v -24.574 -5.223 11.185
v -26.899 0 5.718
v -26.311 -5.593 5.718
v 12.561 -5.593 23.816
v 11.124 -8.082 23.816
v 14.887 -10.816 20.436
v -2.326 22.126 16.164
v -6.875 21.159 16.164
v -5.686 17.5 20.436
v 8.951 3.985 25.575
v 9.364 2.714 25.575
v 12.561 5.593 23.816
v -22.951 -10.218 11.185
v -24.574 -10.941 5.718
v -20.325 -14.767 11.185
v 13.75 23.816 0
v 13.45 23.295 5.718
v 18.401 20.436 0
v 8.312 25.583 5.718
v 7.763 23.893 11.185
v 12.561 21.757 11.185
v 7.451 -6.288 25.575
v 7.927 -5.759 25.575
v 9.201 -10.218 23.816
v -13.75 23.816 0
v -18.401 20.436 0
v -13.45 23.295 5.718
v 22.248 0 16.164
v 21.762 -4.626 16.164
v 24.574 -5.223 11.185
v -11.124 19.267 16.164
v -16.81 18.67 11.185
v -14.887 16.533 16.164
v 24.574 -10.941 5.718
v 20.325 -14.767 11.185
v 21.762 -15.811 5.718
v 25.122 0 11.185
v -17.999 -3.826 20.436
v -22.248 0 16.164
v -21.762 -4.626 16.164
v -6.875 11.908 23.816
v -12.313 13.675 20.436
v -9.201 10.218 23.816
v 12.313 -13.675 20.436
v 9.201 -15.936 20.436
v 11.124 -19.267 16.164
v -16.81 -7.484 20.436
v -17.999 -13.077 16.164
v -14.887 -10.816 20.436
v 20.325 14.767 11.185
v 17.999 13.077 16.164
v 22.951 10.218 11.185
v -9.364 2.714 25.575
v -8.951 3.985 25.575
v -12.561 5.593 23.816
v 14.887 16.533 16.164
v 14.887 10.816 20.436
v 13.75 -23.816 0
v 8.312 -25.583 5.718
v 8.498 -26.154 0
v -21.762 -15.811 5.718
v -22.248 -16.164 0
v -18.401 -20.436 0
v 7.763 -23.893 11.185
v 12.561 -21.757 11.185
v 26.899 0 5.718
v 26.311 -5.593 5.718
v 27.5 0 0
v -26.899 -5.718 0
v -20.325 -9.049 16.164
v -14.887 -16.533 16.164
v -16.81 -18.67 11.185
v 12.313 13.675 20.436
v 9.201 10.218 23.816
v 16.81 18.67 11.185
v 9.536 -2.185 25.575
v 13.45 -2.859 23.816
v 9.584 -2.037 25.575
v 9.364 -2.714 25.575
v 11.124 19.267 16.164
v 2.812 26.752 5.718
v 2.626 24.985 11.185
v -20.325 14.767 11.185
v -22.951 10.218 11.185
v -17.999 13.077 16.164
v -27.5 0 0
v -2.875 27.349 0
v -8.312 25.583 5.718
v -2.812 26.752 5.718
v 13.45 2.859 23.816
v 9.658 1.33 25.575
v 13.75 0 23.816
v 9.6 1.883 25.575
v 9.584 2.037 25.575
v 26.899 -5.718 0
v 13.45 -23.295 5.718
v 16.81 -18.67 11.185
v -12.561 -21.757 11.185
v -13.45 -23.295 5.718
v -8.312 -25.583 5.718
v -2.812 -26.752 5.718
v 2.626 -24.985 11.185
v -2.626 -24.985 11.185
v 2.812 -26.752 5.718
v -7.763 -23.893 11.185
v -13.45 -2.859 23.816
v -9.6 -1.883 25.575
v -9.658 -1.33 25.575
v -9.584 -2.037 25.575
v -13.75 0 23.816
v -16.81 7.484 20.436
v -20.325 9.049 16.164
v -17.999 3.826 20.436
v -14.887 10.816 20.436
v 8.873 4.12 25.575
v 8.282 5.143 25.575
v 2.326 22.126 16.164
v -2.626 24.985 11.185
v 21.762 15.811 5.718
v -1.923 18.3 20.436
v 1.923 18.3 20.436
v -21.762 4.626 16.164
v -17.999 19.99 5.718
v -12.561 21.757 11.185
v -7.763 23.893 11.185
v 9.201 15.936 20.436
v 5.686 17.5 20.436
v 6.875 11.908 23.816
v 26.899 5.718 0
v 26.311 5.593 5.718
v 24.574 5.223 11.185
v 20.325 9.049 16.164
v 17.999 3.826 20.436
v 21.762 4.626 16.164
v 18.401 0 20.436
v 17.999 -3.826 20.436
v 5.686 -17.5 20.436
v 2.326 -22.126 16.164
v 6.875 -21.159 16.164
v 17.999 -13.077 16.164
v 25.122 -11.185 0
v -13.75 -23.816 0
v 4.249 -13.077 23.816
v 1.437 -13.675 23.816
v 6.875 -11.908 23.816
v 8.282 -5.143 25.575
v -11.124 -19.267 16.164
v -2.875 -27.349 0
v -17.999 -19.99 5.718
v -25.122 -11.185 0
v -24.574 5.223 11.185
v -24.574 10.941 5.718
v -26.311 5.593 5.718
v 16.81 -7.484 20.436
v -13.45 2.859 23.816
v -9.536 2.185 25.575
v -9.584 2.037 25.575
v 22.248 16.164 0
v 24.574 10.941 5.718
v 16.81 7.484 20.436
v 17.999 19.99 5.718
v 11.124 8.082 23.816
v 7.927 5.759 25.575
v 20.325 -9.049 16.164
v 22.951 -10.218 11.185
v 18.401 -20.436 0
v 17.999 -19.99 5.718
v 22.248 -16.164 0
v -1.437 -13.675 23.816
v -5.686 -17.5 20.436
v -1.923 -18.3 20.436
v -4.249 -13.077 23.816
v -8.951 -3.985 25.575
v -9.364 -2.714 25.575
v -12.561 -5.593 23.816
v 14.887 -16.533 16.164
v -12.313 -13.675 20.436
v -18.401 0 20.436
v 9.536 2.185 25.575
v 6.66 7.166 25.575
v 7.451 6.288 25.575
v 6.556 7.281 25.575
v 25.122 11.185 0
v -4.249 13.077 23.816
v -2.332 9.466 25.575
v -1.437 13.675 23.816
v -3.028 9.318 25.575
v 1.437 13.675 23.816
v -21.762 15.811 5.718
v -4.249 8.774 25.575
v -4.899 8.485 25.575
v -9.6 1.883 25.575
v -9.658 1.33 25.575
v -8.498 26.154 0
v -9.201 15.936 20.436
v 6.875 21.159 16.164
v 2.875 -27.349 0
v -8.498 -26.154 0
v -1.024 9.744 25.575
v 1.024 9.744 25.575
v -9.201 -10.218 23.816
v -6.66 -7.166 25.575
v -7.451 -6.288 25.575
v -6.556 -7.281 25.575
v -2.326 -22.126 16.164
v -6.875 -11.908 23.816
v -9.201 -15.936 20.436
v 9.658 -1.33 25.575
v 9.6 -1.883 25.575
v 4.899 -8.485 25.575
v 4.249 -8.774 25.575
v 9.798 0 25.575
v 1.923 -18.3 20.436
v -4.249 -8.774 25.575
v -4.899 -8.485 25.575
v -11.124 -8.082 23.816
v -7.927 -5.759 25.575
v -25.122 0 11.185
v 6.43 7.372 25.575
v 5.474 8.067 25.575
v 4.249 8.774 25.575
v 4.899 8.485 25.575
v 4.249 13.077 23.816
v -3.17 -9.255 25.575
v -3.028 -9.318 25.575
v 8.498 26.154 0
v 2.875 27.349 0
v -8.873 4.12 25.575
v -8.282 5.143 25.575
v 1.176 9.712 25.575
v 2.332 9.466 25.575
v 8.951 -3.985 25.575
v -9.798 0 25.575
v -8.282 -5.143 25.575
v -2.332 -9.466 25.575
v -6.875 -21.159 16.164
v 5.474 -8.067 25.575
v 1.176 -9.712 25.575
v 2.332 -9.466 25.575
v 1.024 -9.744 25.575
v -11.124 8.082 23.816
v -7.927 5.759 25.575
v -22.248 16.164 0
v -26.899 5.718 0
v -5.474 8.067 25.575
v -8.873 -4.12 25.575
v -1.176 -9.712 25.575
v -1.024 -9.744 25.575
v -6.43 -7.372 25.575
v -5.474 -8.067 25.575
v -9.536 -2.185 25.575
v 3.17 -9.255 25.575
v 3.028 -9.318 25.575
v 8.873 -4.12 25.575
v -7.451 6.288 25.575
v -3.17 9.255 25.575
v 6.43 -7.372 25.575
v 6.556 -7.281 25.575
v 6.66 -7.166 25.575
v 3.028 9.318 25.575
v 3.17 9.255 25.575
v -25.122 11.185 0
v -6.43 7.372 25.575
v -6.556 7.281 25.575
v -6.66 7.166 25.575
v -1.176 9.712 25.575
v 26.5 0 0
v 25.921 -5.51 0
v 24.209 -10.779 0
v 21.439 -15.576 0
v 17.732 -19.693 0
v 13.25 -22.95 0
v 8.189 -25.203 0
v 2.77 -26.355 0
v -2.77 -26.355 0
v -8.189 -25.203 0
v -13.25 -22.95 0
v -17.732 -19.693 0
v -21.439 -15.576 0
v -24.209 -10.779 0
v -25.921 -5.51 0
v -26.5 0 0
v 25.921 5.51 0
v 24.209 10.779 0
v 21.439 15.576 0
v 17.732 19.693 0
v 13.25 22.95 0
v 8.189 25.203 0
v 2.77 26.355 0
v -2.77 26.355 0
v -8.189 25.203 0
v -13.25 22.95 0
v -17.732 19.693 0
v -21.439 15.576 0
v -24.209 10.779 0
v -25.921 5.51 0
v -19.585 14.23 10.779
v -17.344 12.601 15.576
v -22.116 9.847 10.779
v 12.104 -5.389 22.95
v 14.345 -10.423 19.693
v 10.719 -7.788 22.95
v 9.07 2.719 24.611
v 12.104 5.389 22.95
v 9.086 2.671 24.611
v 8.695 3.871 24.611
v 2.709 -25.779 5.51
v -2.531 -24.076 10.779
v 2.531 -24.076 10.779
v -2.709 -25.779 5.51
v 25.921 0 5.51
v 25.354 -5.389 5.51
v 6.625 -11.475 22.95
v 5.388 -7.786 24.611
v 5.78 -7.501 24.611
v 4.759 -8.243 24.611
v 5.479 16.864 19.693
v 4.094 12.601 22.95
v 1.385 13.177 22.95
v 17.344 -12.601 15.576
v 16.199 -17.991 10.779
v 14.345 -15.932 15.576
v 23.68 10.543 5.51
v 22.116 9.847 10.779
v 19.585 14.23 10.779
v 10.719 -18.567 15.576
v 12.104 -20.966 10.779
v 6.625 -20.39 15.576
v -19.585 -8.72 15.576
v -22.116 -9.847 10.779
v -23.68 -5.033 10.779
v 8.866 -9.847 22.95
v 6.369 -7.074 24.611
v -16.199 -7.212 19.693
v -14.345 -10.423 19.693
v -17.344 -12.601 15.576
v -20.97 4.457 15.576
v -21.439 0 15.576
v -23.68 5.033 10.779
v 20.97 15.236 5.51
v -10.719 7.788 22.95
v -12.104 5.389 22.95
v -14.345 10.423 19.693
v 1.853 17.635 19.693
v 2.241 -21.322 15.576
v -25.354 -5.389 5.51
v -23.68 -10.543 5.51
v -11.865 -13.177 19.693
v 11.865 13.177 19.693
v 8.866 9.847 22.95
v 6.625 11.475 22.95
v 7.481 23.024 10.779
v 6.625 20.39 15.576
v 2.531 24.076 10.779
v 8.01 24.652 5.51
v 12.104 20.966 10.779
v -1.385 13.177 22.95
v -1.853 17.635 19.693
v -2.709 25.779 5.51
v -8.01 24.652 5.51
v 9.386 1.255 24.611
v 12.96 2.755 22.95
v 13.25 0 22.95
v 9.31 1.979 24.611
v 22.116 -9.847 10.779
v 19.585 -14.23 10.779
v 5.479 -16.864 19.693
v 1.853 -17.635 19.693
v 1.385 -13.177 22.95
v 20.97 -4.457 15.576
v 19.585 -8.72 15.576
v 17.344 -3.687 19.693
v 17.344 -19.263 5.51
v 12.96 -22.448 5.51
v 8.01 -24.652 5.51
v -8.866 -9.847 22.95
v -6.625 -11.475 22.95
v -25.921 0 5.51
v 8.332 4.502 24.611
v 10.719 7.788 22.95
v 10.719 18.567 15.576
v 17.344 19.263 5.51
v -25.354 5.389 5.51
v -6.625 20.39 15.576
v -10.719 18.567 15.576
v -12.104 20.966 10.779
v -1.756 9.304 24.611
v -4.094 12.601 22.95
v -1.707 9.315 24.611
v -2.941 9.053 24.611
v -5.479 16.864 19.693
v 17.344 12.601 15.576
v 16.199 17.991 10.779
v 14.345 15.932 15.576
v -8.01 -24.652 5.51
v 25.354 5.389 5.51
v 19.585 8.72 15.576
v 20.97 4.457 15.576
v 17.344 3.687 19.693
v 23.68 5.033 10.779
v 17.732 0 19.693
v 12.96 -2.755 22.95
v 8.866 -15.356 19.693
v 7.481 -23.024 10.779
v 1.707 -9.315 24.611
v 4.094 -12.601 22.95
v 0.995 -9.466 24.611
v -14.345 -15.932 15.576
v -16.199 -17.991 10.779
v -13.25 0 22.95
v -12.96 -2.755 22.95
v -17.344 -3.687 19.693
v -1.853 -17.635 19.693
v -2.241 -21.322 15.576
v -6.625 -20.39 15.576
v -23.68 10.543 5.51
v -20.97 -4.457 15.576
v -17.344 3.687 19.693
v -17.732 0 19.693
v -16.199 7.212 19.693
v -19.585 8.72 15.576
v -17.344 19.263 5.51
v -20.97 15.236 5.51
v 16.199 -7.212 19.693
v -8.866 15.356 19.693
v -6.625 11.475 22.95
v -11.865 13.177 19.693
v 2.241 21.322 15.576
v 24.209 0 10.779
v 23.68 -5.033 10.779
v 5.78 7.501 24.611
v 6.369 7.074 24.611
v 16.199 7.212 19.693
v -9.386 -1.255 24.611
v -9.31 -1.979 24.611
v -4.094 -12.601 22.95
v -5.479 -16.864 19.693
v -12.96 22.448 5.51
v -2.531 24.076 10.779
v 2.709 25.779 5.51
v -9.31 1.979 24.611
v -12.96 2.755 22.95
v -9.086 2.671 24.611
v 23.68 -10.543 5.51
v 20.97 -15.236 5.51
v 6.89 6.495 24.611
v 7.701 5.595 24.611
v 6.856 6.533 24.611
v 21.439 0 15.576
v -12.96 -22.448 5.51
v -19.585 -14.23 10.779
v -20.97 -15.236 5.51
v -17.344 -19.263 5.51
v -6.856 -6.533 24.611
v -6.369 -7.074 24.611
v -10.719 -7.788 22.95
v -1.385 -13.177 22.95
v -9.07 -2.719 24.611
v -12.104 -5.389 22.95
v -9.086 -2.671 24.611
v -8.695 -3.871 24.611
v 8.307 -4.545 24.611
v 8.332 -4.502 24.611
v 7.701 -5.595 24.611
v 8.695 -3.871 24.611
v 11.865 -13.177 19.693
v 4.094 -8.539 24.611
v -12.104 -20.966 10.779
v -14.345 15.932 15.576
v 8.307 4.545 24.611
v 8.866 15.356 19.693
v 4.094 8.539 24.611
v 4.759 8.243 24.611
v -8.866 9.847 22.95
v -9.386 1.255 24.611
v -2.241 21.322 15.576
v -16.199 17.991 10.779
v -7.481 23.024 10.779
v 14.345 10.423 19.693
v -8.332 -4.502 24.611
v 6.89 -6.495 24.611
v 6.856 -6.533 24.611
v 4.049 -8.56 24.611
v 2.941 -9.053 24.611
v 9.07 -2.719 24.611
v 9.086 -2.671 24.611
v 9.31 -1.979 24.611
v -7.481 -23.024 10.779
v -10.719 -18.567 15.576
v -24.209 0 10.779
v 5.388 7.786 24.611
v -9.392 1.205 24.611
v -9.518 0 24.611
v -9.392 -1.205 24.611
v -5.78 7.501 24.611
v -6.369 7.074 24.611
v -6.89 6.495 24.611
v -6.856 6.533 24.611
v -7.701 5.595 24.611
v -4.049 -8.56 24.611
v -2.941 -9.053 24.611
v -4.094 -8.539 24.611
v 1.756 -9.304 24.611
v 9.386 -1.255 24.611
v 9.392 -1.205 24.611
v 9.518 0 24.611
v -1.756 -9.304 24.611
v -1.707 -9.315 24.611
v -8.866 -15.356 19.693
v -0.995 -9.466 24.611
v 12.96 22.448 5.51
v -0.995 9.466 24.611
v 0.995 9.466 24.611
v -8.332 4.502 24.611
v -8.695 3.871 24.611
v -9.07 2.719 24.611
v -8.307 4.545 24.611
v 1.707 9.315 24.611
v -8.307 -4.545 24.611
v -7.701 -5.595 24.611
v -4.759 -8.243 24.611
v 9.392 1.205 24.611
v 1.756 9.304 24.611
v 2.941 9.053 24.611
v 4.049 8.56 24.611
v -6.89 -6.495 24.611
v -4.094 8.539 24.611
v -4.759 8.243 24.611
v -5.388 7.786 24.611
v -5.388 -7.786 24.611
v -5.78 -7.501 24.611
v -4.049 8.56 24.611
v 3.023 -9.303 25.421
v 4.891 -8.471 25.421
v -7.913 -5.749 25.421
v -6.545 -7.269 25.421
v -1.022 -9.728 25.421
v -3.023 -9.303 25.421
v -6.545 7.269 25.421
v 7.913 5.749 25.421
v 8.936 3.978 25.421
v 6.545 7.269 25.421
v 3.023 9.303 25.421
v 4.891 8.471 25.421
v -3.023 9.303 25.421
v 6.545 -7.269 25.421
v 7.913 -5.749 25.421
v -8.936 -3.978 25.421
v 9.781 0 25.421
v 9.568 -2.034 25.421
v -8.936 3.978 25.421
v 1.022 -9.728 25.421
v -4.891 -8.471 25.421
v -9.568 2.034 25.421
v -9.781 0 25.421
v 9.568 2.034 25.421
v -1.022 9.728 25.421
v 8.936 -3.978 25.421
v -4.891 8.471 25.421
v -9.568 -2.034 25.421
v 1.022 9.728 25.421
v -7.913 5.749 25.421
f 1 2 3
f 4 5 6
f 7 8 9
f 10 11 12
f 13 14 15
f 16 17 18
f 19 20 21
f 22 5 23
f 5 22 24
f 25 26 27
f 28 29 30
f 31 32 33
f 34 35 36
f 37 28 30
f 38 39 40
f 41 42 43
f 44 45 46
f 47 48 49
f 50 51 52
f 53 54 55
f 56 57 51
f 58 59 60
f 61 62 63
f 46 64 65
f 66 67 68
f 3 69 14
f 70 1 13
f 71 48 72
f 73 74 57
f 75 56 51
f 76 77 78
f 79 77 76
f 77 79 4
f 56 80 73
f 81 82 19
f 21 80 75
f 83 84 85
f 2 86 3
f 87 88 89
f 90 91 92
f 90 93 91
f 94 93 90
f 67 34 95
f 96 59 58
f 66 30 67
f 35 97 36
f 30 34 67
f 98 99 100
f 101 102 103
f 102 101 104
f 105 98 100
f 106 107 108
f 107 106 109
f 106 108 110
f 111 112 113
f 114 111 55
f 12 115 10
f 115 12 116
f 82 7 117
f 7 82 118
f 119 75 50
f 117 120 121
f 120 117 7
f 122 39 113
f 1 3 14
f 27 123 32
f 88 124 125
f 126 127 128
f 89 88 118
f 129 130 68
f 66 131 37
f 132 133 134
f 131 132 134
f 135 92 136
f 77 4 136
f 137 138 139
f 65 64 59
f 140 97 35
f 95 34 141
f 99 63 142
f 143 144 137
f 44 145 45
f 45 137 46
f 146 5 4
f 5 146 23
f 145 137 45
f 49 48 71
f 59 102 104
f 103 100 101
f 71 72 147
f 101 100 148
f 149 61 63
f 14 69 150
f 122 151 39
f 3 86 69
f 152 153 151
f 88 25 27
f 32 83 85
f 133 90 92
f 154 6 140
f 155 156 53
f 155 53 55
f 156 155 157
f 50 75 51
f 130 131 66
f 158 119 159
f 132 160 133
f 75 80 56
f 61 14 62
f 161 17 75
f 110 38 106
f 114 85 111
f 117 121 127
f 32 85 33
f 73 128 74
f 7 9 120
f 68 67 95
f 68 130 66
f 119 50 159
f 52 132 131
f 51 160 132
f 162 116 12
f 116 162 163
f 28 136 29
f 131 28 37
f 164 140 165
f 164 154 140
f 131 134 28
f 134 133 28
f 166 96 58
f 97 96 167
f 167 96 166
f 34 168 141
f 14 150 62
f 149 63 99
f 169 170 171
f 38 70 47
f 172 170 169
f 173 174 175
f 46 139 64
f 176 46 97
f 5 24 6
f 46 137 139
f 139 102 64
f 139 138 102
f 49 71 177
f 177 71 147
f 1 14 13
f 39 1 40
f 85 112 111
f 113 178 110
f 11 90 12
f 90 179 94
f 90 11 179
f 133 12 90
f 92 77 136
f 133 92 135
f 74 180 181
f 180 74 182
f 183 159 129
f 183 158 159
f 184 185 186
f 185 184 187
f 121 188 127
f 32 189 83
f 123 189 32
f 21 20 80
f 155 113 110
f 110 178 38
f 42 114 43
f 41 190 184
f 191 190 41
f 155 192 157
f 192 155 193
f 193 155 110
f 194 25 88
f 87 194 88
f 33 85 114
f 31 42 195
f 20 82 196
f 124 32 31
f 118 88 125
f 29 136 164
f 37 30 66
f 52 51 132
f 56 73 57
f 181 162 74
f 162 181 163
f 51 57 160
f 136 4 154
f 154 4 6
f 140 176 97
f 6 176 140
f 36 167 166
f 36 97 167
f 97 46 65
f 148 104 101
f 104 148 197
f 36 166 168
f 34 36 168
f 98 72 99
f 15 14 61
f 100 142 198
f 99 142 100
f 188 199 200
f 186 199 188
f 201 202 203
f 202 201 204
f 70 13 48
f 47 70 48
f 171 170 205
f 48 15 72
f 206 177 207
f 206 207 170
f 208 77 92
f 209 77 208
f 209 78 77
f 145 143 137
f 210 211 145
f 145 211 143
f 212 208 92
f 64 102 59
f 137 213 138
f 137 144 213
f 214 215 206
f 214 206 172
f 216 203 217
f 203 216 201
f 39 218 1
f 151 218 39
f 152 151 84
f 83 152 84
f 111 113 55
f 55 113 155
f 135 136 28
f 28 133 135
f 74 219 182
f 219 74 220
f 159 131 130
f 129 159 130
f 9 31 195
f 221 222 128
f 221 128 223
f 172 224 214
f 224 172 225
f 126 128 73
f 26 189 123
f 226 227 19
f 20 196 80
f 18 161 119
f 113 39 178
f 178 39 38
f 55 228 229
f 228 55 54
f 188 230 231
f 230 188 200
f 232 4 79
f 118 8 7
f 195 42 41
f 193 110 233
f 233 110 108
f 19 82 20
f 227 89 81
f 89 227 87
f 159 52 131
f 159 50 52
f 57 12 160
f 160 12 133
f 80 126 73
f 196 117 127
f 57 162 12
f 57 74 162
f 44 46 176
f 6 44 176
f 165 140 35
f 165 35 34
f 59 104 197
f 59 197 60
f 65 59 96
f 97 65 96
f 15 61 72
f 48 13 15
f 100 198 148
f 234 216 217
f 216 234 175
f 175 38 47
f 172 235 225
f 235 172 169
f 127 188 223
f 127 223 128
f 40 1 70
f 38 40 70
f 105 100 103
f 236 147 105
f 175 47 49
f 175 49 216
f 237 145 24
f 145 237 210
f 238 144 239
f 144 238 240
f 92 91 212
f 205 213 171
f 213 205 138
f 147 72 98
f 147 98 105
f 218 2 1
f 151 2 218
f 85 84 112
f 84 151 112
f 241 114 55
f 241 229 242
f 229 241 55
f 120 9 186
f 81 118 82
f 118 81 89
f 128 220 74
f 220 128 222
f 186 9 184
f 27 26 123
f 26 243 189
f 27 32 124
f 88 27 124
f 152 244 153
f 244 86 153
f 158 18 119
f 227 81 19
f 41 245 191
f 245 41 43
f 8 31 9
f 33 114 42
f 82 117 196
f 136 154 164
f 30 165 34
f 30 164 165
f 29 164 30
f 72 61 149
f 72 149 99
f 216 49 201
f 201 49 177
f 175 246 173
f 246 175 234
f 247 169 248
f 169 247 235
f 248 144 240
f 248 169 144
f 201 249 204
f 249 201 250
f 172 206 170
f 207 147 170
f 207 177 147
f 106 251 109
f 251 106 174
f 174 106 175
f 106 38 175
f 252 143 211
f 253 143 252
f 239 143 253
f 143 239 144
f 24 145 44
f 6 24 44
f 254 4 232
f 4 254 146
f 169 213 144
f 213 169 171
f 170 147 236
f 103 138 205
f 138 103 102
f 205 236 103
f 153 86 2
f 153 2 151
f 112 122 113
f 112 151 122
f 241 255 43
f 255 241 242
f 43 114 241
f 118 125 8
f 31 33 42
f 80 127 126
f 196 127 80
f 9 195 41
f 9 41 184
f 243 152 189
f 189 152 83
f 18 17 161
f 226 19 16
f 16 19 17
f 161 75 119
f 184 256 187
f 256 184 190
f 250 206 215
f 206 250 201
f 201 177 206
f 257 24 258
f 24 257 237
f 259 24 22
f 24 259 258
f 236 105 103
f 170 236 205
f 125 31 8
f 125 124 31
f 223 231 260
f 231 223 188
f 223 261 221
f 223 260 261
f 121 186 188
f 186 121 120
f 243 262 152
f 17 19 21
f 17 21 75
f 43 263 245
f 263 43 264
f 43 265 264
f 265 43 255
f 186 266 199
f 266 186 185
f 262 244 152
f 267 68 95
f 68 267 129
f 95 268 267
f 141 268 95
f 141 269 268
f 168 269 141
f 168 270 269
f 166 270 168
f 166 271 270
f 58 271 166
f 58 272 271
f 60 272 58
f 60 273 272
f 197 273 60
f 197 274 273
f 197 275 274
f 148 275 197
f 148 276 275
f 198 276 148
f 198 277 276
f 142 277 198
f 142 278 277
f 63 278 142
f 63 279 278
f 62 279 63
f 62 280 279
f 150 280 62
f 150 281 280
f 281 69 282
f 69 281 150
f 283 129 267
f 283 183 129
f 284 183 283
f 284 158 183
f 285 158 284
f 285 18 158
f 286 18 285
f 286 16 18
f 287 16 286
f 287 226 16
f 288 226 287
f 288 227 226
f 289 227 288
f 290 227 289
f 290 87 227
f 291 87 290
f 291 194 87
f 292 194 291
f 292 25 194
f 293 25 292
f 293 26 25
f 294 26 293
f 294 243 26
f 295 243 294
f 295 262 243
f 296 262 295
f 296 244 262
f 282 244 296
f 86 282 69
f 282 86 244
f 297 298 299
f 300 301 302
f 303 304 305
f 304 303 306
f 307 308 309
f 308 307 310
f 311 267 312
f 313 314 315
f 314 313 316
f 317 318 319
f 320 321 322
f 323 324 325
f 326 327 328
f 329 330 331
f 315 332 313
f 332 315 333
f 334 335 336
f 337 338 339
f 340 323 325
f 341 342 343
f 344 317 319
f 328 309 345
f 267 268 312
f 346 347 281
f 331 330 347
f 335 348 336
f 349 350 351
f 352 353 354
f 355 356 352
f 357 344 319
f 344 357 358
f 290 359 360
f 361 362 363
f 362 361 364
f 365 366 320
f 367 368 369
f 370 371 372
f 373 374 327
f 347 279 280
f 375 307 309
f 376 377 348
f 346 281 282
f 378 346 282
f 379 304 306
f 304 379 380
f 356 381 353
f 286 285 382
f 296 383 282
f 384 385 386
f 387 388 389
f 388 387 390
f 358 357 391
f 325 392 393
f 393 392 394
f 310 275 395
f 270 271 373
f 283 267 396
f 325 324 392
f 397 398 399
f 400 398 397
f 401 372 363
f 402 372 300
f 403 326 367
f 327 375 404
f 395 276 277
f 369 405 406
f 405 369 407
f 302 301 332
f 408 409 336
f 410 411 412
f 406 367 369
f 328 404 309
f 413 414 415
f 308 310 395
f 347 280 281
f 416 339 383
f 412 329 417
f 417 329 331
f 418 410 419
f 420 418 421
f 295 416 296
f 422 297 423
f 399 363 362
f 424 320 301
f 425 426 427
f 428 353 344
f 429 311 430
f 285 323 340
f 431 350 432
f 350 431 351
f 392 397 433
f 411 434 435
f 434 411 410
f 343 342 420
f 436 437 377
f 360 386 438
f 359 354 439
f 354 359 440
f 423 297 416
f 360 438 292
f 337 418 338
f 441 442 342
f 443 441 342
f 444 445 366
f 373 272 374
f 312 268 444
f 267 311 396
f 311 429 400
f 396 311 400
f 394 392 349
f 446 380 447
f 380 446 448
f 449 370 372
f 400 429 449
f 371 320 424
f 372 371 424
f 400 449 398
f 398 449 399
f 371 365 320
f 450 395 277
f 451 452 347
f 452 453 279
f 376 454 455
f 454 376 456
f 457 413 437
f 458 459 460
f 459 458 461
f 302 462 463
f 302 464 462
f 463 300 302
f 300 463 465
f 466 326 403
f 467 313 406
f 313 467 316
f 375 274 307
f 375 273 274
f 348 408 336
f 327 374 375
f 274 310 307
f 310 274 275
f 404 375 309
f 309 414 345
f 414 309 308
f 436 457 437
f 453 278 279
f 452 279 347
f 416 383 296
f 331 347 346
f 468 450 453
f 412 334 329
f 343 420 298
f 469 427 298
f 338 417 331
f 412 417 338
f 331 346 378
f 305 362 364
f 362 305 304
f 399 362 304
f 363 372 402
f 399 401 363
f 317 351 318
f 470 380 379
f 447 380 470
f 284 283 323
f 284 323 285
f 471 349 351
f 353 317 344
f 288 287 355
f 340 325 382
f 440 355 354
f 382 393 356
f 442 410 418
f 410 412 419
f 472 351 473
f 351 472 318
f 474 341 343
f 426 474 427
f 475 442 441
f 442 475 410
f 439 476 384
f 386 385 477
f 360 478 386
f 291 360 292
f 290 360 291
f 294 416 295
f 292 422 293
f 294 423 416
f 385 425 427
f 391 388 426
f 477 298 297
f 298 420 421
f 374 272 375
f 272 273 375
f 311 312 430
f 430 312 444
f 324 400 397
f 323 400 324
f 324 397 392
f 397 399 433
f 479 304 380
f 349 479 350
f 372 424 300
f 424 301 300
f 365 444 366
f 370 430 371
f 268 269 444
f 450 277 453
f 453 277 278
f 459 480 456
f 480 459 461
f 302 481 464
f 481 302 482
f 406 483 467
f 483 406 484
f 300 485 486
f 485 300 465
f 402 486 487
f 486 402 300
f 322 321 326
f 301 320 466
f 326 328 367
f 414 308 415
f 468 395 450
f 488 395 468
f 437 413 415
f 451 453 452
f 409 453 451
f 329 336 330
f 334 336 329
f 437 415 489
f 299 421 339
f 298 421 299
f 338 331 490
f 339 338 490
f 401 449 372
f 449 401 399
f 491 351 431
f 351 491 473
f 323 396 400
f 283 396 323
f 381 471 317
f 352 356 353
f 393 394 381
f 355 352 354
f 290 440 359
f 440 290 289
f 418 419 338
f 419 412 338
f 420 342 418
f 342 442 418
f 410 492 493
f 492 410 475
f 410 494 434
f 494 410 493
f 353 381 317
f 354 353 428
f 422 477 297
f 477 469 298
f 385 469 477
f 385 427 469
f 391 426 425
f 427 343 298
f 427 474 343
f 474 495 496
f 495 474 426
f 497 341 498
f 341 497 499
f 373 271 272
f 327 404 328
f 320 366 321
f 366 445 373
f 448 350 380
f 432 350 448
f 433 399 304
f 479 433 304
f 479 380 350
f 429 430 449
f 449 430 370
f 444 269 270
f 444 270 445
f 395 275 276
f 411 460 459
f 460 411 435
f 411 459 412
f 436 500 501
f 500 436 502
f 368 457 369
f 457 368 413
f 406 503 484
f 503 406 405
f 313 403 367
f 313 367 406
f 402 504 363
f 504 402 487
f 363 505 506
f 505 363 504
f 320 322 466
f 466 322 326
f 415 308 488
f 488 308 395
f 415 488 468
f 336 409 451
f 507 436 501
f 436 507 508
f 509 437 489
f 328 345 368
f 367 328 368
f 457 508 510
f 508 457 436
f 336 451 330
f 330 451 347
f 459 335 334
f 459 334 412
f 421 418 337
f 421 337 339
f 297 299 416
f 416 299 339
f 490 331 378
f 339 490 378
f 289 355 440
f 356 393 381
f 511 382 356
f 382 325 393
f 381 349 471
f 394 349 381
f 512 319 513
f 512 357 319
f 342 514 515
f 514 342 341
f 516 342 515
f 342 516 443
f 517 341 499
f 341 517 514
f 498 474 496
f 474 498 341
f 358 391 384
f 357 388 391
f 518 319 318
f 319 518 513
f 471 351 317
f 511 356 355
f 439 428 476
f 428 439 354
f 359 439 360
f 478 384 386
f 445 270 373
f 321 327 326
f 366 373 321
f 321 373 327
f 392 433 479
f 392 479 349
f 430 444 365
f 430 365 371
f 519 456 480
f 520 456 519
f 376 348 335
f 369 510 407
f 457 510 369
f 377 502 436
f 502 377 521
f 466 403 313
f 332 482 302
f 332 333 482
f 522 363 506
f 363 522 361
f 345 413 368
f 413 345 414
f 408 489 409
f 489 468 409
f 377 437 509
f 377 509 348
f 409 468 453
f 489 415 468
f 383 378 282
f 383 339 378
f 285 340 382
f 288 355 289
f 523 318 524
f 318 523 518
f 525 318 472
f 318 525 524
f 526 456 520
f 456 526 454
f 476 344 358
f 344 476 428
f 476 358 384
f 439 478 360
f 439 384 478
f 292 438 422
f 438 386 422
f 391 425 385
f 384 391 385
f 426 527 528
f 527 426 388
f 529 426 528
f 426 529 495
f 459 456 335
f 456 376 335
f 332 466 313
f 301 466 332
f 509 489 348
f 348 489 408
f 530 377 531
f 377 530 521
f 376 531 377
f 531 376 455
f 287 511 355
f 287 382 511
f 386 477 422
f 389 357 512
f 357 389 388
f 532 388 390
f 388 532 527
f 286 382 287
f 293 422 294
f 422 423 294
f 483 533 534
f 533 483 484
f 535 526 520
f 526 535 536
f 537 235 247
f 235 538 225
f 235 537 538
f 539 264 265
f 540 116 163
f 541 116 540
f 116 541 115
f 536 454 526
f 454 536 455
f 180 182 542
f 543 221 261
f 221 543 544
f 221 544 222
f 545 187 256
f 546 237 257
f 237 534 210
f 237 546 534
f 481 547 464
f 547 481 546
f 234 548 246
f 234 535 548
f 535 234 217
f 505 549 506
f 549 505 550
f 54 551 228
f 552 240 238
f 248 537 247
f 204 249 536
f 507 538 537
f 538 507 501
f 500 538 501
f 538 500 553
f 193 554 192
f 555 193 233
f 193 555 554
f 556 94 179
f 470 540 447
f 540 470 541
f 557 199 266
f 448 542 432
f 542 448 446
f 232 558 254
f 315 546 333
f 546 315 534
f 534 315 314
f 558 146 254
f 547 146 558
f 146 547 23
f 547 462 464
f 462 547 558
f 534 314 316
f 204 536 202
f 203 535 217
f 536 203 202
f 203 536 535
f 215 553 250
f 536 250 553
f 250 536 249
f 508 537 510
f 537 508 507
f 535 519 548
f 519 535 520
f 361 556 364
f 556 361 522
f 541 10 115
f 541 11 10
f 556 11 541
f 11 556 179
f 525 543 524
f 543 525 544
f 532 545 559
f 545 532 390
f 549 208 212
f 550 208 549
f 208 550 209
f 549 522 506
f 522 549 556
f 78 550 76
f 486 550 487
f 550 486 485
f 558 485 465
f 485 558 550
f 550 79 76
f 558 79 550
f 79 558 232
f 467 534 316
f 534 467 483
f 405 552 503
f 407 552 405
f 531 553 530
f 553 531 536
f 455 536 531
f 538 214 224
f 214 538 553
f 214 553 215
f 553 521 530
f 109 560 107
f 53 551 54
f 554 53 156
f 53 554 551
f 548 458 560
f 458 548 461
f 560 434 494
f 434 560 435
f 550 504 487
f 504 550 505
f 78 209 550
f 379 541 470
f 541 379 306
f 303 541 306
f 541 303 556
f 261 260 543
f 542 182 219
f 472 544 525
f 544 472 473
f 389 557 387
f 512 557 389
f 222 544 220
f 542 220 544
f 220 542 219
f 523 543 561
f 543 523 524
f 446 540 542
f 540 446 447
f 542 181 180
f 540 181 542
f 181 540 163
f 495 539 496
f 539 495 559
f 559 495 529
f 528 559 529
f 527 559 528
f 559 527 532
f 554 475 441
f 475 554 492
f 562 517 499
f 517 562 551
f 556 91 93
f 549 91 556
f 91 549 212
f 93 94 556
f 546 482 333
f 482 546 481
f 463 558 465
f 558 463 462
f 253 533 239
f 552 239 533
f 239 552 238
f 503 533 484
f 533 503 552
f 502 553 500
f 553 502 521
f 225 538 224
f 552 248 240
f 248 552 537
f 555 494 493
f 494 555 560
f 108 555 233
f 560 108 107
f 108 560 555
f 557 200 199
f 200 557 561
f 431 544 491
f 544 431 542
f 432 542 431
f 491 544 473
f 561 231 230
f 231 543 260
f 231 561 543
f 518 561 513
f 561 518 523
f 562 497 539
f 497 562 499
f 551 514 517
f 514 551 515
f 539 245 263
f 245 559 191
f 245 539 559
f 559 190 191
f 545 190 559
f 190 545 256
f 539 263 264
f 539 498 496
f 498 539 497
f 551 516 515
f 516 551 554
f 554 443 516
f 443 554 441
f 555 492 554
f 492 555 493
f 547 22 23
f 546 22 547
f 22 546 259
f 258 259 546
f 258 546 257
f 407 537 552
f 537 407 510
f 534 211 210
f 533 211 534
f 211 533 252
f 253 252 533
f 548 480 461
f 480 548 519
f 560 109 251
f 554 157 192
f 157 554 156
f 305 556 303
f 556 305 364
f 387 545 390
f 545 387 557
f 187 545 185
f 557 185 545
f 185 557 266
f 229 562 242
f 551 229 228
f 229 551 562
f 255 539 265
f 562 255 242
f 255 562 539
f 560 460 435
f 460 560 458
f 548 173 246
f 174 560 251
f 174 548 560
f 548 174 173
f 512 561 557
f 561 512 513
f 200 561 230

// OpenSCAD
box_width_in_onions = 2;
box_length_in_onions = 2;
onion_size = 55;
step_between_onions = 5;
root_diameter = 15;
green_diameter = 20;
compressor_diameter = 6;
sphere_sides = 30;

mode = "onion_cup"; // box, box_top, onion_cup

module box(box_width_in_onions, onion_size, step_between_onions) {
    width = box_width_in_onions * (onion_size + step_between_onions) + 5;
    length = box_length_in_onions * (onion_size + step_between_onions) + 5;
    height = onion_size / 2 + 5;

    difference() {
        cube([width, length, height], center=true);

        translate([0, 0, 1.2]) {
            cube([width - 1, length - 1, height], center=true);
        }

        translate([0, width / 2, height / 2 - 5]) {
            rotate([90, 0, 0]) {
                cylinder($fn=20, h=3, d=compressor_diameter, center=true);
            }
        }
    }
};

module box_top(box_width_in_onions, onion_size, step_between_onions) {
    width = box_width_in_onions * (onion_size + step_between_onions) + 7;
    length = box_length_in_onions * (onion_size + step_between_onions) + 7;
    space = onion_size + step_between_onions;
    step = onion_size / 2 + step_between_onions;

    difference() {
        union() {
            cube([width, length, 1.5], center=false);

            for (i = [0 : box_width_in_onions-1]) {
                for (j = [0 : box_length_in_onions-1]) {
                    translate([space * i + step, space * j + step, 0]) {
                        difference() {
                            sphere($fn=sphere_sides, d=onion_size);

                            translate([-onion_size / 2, -onion_size / 2, 0]) {
                                cube(size=onion_size, center=false);
                            }
                        }
                    }
                }
            }
        }

        for (i = [0 : box_width_in_onions-1]) {
            for (j = [0 : box_length_in_onions-1]) {
                onion_cup_hole(space * i + step, space * j + step, -onion_size / 2, root_diameter);
            }
        }
    }
};

module onion_cup() {
    difference() {
        union() {
            translate([0, 0, 0]) {
                difference() {
                    sphere($fn=sphere_sides, d=onion_size);

                    translate([0, 0, -onion_size / 2]) {
                        cube(size=onion_size, center=true);
                    }
                }
            }
        }

        onion_cup_hole(0, 0, onion_size / 2, green_diameter);
    }
};

module onion_cup_hole(x, y, z, diameter) {
    translate([x, y, 0]) {
        sphere($fn=sphere_sides, d=onion_size-2);
    }

    translate([x, y, z]) {
        sphere(d=diameter);
    }
};

if (mode == "box") {
    box(box_width_in_onions, onion_size, step_between_onions);
}
if (mode == "box_top") {
    box_top(box_width_in_onions, onion_size, step_between_onions);
}
if (mode == "onion_cup") {
    onion_cup();
}
